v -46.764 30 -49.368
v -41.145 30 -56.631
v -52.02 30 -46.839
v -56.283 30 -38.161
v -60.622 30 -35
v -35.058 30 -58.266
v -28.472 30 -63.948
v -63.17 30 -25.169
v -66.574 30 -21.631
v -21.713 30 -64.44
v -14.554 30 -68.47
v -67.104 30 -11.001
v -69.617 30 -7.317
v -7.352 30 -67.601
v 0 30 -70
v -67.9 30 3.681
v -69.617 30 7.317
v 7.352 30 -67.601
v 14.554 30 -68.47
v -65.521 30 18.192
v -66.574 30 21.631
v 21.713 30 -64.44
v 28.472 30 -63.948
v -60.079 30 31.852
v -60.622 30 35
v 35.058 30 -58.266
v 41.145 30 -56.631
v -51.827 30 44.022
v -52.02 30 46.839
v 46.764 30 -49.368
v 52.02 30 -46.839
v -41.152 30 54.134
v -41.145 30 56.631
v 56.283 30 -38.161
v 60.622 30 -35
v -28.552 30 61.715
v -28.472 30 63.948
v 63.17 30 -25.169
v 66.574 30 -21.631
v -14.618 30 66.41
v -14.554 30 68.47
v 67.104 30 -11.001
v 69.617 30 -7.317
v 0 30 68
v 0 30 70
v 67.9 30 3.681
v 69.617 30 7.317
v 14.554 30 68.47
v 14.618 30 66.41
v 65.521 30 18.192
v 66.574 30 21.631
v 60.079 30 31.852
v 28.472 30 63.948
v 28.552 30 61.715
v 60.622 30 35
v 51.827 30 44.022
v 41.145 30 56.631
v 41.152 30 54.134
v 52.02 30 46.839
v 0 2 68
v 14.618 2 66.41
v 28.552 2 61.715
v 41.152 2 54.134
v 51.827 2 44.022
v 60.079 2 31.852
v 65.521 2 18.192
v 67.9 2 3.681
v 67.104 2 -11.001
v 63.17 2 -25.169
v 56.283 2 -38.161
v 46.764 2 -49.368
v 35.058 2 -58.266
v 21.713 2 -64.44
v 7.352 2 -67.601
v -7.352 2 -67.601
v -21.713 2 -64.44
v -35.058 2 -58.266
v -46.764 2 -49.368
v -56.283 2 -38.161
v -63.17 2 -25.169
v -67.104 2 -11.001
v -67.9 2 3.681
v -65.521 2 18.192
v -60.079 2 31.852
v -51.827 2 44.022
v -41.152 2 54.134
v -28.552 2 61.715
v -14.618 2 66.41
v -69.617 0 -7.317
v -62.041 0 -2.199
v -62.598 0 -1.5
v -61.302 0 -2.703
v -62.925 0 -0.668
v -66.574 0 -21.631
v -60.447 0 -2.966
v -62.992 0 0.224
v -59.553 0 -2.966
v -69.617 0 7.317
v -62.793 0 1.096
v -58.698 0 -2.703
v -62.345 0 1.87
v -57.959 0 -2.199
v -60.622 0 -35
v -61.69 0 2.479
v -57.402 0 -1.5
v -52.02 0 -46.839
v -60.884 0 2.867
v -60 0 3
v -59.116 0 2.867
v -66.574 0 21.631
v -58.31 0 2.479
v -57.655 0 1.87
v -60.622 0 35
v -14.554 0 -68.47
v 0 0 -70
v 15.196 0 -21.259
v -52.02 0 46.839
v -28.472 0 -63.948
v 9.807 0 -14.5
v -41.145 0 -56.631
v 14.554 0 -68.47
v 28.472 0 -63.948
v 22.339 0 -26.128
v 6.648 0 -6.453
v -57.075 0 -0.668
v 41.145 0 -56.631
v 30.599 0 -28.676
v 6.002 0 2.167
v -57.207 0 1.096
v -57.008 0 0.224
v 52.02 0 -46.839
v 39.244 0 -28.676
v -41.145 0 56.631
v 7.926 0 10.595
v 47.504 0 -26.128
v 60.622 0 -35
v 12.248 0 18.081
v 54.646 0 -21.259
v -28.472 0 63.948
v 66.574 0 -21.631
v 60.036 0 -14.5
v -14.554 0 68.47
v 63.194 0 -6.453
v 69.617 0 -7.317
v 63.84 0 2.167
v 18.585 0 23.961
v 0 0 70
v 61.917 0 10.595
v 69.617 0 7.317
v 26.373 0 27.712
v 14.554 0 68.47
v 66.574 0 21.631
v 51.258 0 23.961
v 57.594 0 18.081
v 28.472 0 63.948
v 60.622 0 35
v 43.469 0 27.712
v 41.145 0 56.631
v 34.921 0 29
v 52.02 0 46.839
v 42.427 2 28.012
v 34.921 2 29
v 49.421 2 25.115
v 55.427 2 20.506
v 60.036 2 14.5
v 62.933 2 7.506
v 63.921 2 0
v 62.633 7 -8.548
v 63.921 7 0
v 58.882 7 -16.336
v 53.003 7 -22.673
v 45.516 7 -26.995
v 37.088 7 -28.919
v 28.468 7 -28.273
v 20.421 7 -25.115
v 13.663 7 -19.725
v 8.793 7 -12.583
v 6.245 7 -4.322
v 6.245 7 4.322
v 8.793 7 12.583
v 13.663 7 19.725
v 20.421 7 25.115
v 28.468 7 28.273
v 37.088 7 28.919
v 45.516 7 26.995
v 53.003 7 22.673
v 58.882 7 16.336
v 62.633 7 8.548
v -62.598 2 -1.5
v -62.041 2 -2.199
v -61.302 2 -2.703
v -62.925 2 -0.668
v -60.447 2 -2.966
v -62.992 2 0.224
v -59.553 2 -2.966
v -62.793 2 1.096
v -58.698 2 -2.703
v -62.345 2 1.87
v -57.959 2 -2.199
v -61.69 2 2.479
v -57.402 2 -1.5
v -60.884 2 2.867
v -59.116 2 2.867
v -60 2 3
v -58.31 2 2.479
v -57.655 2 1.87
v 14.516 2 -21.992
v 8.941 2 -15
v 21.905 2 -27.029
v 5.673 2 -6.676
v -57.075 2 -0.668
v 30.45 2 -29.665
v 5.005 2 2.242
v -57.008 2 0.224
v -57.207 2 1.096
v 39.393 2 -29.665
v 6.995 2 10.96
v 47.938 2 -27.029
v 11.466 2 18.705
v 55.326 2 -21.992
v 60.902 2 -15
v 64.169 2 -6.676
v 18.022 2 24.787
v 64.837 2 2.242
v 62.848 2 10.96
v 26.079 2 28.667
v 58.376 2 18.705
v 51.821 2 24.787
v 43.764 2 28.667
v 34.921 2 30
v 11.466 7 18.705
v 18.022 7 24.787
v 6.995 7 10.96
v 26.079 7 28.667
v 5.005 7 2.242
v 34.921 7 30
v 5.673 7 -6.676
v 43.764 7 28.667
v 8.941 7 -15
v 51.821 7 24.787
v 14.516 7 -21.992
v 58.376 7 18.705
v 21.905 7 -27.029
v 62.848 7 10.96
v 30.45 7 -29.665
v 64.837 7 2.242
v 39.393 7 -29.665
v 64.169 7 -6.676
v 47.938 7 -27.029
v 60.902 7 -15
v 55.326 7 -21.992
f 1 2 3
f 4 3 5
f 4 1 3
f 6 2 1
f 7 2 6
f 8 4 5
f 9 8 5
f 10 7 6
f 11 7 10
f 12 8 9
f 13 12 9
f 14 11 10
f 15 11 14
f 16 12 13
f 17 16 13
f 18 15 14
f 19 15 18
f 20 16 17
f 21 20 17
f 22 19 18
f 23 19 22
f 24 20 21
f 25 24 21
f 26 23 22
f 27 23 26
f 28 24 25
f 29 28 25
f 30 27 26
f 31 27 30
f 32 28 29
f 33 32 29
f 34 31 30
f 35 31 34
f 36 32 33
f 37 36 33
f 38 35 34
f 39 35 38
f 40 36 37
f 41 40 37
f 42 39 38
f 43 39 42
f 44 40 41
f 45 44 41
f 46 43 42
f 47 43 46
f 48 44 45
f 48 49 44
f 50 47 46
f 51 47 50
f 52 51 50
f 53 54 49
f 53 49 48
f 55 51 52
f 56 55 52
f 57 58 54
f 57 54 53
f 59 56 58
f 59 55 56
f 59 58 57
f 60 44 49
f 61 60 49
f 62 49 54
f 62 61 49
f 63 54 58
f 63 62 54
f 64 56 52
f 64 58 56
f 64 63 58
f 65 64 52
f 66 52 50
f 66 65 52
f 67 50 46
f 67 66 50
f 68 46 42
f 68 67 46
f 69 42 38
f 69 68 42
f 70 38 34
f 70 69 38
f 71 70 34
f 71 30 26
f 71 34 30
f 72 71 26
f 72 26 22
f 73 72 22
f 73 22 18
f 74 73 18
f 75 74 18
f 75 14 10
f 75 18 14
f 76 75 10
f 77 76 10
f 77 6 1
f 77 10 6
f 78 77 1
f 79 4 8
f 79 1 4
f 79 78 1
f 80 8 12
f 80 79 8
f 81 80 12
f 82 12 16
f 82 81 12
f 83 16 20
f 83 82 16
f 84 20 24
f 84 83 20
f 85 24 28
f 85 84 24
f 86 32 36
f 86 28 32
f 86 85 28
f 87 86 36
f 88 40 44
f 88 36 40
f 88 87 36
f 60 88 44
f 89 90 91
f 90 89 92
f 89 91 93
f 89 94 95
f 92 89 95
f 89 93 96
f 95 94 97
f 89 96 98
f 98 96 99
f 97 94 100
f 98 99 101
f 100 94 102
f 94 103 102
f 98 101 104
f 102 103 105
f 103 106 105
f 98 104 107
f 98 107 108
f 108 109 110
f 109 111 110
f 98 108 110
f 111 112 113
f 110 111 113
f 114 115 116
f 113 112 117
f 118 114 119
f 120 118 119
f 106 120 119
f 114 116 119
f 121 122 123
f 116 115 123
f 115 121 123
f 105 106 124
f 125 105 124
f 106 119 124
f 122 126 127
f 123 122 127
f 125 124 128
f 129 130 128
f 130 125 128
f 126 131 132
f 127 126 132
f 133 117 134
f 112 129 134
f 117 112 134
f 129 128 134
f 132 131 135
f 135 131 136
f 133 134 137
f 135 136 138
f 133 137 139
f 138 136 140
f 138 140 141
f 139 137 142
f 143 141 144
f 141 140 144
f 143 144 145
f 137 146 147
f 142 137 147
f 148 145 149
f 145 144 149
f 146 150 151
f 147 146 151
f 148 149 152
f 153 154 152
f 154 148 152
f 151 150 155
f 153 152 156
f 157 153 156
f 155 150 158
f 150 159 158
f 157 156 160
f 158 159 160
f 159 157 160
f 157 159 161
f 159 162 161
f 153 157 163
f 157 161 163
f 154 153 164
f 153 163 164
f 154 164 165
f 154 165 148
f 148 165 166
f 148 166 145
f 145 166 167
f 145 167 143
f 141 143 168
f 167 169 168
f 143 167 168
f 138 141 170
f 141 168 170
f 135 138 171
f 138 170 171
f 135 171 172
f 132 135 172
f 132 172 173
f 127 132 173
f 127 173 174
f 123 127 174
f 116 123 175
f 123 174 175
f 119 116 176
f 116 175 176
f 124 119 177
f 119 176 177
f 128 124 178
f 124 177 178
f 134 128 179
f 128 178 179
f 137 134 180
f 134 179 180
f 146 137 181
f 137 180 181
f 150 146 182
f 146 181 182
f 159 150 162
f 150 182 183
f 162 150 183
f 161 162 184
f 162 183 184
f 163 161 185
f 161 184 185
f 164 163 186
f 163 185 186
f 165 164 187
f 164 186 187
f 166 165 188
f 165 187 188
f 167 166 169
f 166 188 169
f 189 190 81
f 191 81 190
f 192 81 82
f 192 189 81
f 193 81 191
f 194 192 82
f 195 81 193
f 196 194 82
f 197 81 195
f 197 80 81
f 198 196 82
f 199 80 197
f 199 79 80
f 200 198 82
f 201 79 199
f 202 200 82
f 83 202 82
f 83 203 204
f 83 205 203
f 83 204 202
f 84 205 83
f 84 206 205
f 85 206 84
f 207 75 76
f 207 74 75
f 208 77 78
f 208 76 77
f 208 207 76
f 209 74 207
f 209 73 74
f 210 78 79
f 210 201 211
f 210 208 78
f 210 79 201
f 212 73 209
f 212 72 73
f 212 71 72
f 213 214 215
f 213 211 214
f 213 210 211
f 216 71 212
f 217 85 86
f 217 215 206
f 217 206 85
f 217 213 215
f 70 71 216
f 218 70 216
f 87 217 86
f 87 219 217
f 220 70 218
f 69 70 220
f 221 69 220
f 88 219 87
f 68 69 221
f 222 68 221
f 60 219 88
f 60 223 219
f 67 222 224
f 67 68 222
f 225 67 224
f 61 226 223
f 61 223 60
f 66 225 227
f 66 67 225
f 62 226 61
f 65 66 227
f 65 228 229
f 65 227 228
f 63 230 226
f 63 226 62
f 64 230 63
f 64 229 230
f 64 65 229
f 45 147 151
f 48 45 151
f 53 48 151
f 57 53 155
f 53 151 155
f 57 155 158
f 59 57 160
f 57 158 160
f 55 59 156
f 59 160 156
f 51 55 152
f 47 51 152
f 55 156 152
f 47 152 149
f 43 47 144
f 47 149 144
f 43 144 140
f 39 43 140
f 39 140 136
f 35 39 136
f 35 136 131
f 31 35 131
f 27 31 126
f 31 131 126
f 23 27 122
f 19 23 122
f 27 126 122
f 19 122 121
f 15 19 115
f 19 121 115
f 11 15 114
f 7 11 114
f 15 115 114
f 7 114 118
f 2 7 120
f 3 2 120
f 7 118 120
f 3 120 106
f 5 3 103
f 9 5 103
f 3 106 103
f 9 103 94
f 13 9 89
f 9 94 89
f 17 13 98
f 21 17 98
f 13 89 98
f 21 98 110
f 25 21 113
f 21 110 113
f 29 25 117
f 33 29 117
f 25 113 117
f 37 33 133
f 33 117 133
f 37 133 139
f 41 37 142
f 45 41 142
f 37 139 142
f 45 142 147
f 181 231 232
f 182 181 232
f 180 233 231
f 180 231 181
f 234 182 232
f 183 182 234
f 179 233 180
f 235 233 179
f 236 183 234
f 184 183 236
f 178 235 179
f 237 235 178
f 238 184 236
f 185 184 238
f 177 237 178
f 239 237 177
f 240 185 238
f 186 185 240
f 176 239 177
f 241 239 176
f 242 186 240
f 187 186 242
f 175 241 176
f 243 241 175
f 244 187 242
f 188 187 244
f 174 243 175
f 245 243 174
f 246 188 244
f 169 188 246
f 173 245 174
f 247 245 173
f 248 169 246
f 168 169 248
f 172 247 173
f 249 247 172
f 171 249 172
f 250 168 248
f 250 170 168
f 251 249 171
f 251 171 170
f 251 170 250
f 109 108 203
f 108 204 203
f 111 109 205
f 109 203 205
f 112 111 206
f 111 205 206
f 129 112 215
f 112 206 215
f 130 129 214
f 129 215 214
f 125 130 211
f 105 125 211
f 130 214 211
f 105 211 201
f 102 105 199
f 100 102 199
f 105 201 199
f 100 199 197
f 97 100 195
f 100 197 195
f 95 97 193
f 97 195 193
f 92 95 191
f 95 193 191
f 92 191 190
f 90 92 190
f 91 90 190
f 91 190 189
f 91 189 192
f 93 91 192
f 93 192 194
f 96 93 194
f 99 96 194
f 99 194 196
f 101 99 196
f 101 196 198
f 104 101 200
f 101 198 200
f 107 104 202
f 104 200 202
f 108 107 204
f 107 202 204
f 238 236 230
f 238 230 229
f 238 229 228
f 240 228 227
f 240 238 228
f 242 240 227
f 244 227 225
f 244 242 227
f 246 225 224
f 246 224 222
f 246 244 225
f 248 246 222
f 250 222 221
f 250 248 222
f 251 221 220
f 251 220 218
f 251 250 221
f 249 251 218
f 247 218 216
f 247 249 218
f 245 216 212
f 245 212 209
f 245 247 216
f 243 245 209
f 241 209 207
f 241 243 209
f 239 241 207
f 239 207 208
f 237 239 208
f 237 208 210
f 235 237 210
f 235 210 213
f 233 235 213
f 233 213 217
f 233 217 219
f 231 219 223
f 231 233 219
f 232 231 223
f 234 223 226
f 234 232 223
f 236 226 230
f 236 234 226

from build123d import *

# Parameters (mm, degrees)
SKETCH1_R           = 70
BOSS_EXTRUDE1_DEPTH = 30
SHELL1_T            = -2
SKETCH2_R           = 33
SKETCH2_R_2         = 29
EXTRUDE_THIN1_DEPTH = 5
SKETCH3_R           = 33
SKETCH3_R_2         = 30
CUT_EXTRUDE1_DEPTH  = 5
SKETCH4_R           = 29
CUT_EXTRUDE2_DEPTH  = 2
SKETCH5_R           = 3
CUT_EXTRUDE3_DEPTH  = 5


with BuildPart() as part:
    # Sketch1 → Boss-Extrude1 (new body)
    with BuildSketch(Plane(origin=(0, 0, 0), x_dir=(1, 0, 0), z_dir=(0, 1, 0))):
        with Locations(Location((0, 0, 0), (0, 0, 270))):
            Circle(SKETCH1_R)
    extrude(amount=BOSS_EXTRUDE1_DEPTH)

    # Shell1
    shell1_openings = [part.faces().sort_by_distance(p)[0] for p in [
        (0, 30, 0),
    ]]
    offset(amount=SHELL1_T, openings=shell1_openings, kind=Kind.INTERSECTION)

    # Sketch2 → Extrude-Thin1 (add)
    with BuildSketch(Plane(origin=(0, 2, 0), x_dir=(1, 0, 0), z_dir=(0, 1, 0))):
        with Locations((34.921312676, 0)):
            Circle(SKETCH2_R)
        with Locations((34.921312676, 0)):
            Circle(SKETCH2_R_2, mode=Mode.SUBTRACT)
    extrude(amount=EXTRUDE_THIN1_DEPTH)

    # Sketch3 → Cut-Extrude1 (cut)
    with BuildSketch(Plane(origin=(0, 7, 0), x_dir=(1, 0, 0), z_dir=(0, 1, 0))):
        with Locations((34.921312676, 0)):
            Circle(SKETCH3_R)
        with Locations(Location((34.921312676, 0, 0), (0, 0, 270))):
            Circle(SKETCH3_R_2, mode=Mode.SUBTRACT)
    extrude(amount=-CUT_EXTRUDE1_DEPTH, mode=Mode.SUBTRACT)

    # Sketch4 → Cut-Extrude2 (cut)
    with BuildSketch(Plane(origin=(0, 2, 0), x_dir=(1, 0, 0), z_dir=(0, 1, 0))):
        with Locations(Location((34.921312676, 0, 0), (0, 0, 270))):
            Circle(SKETCH4_R)
    extrude(amount=-CUT_EXTRUDE2_DEPTH, mode=Mode.SUBTRACT)

    # Sketch5 → Cut-Extrude3 (cut, symmetric)
    with BuildSketch(Plane(origin=(0, 2, 0), x_dir=(1, 0, 0), z_dir=(0, 1, 0))):
        with Locations(Location((-60, 0, 0), (0, 0, 270))):
            Circle(SKETCH5_R)
    extrude(amount=CUT_EXTRUDE3_DEPTH, both=True, mode=Mode.SUBTRACT)


solid = part.part
